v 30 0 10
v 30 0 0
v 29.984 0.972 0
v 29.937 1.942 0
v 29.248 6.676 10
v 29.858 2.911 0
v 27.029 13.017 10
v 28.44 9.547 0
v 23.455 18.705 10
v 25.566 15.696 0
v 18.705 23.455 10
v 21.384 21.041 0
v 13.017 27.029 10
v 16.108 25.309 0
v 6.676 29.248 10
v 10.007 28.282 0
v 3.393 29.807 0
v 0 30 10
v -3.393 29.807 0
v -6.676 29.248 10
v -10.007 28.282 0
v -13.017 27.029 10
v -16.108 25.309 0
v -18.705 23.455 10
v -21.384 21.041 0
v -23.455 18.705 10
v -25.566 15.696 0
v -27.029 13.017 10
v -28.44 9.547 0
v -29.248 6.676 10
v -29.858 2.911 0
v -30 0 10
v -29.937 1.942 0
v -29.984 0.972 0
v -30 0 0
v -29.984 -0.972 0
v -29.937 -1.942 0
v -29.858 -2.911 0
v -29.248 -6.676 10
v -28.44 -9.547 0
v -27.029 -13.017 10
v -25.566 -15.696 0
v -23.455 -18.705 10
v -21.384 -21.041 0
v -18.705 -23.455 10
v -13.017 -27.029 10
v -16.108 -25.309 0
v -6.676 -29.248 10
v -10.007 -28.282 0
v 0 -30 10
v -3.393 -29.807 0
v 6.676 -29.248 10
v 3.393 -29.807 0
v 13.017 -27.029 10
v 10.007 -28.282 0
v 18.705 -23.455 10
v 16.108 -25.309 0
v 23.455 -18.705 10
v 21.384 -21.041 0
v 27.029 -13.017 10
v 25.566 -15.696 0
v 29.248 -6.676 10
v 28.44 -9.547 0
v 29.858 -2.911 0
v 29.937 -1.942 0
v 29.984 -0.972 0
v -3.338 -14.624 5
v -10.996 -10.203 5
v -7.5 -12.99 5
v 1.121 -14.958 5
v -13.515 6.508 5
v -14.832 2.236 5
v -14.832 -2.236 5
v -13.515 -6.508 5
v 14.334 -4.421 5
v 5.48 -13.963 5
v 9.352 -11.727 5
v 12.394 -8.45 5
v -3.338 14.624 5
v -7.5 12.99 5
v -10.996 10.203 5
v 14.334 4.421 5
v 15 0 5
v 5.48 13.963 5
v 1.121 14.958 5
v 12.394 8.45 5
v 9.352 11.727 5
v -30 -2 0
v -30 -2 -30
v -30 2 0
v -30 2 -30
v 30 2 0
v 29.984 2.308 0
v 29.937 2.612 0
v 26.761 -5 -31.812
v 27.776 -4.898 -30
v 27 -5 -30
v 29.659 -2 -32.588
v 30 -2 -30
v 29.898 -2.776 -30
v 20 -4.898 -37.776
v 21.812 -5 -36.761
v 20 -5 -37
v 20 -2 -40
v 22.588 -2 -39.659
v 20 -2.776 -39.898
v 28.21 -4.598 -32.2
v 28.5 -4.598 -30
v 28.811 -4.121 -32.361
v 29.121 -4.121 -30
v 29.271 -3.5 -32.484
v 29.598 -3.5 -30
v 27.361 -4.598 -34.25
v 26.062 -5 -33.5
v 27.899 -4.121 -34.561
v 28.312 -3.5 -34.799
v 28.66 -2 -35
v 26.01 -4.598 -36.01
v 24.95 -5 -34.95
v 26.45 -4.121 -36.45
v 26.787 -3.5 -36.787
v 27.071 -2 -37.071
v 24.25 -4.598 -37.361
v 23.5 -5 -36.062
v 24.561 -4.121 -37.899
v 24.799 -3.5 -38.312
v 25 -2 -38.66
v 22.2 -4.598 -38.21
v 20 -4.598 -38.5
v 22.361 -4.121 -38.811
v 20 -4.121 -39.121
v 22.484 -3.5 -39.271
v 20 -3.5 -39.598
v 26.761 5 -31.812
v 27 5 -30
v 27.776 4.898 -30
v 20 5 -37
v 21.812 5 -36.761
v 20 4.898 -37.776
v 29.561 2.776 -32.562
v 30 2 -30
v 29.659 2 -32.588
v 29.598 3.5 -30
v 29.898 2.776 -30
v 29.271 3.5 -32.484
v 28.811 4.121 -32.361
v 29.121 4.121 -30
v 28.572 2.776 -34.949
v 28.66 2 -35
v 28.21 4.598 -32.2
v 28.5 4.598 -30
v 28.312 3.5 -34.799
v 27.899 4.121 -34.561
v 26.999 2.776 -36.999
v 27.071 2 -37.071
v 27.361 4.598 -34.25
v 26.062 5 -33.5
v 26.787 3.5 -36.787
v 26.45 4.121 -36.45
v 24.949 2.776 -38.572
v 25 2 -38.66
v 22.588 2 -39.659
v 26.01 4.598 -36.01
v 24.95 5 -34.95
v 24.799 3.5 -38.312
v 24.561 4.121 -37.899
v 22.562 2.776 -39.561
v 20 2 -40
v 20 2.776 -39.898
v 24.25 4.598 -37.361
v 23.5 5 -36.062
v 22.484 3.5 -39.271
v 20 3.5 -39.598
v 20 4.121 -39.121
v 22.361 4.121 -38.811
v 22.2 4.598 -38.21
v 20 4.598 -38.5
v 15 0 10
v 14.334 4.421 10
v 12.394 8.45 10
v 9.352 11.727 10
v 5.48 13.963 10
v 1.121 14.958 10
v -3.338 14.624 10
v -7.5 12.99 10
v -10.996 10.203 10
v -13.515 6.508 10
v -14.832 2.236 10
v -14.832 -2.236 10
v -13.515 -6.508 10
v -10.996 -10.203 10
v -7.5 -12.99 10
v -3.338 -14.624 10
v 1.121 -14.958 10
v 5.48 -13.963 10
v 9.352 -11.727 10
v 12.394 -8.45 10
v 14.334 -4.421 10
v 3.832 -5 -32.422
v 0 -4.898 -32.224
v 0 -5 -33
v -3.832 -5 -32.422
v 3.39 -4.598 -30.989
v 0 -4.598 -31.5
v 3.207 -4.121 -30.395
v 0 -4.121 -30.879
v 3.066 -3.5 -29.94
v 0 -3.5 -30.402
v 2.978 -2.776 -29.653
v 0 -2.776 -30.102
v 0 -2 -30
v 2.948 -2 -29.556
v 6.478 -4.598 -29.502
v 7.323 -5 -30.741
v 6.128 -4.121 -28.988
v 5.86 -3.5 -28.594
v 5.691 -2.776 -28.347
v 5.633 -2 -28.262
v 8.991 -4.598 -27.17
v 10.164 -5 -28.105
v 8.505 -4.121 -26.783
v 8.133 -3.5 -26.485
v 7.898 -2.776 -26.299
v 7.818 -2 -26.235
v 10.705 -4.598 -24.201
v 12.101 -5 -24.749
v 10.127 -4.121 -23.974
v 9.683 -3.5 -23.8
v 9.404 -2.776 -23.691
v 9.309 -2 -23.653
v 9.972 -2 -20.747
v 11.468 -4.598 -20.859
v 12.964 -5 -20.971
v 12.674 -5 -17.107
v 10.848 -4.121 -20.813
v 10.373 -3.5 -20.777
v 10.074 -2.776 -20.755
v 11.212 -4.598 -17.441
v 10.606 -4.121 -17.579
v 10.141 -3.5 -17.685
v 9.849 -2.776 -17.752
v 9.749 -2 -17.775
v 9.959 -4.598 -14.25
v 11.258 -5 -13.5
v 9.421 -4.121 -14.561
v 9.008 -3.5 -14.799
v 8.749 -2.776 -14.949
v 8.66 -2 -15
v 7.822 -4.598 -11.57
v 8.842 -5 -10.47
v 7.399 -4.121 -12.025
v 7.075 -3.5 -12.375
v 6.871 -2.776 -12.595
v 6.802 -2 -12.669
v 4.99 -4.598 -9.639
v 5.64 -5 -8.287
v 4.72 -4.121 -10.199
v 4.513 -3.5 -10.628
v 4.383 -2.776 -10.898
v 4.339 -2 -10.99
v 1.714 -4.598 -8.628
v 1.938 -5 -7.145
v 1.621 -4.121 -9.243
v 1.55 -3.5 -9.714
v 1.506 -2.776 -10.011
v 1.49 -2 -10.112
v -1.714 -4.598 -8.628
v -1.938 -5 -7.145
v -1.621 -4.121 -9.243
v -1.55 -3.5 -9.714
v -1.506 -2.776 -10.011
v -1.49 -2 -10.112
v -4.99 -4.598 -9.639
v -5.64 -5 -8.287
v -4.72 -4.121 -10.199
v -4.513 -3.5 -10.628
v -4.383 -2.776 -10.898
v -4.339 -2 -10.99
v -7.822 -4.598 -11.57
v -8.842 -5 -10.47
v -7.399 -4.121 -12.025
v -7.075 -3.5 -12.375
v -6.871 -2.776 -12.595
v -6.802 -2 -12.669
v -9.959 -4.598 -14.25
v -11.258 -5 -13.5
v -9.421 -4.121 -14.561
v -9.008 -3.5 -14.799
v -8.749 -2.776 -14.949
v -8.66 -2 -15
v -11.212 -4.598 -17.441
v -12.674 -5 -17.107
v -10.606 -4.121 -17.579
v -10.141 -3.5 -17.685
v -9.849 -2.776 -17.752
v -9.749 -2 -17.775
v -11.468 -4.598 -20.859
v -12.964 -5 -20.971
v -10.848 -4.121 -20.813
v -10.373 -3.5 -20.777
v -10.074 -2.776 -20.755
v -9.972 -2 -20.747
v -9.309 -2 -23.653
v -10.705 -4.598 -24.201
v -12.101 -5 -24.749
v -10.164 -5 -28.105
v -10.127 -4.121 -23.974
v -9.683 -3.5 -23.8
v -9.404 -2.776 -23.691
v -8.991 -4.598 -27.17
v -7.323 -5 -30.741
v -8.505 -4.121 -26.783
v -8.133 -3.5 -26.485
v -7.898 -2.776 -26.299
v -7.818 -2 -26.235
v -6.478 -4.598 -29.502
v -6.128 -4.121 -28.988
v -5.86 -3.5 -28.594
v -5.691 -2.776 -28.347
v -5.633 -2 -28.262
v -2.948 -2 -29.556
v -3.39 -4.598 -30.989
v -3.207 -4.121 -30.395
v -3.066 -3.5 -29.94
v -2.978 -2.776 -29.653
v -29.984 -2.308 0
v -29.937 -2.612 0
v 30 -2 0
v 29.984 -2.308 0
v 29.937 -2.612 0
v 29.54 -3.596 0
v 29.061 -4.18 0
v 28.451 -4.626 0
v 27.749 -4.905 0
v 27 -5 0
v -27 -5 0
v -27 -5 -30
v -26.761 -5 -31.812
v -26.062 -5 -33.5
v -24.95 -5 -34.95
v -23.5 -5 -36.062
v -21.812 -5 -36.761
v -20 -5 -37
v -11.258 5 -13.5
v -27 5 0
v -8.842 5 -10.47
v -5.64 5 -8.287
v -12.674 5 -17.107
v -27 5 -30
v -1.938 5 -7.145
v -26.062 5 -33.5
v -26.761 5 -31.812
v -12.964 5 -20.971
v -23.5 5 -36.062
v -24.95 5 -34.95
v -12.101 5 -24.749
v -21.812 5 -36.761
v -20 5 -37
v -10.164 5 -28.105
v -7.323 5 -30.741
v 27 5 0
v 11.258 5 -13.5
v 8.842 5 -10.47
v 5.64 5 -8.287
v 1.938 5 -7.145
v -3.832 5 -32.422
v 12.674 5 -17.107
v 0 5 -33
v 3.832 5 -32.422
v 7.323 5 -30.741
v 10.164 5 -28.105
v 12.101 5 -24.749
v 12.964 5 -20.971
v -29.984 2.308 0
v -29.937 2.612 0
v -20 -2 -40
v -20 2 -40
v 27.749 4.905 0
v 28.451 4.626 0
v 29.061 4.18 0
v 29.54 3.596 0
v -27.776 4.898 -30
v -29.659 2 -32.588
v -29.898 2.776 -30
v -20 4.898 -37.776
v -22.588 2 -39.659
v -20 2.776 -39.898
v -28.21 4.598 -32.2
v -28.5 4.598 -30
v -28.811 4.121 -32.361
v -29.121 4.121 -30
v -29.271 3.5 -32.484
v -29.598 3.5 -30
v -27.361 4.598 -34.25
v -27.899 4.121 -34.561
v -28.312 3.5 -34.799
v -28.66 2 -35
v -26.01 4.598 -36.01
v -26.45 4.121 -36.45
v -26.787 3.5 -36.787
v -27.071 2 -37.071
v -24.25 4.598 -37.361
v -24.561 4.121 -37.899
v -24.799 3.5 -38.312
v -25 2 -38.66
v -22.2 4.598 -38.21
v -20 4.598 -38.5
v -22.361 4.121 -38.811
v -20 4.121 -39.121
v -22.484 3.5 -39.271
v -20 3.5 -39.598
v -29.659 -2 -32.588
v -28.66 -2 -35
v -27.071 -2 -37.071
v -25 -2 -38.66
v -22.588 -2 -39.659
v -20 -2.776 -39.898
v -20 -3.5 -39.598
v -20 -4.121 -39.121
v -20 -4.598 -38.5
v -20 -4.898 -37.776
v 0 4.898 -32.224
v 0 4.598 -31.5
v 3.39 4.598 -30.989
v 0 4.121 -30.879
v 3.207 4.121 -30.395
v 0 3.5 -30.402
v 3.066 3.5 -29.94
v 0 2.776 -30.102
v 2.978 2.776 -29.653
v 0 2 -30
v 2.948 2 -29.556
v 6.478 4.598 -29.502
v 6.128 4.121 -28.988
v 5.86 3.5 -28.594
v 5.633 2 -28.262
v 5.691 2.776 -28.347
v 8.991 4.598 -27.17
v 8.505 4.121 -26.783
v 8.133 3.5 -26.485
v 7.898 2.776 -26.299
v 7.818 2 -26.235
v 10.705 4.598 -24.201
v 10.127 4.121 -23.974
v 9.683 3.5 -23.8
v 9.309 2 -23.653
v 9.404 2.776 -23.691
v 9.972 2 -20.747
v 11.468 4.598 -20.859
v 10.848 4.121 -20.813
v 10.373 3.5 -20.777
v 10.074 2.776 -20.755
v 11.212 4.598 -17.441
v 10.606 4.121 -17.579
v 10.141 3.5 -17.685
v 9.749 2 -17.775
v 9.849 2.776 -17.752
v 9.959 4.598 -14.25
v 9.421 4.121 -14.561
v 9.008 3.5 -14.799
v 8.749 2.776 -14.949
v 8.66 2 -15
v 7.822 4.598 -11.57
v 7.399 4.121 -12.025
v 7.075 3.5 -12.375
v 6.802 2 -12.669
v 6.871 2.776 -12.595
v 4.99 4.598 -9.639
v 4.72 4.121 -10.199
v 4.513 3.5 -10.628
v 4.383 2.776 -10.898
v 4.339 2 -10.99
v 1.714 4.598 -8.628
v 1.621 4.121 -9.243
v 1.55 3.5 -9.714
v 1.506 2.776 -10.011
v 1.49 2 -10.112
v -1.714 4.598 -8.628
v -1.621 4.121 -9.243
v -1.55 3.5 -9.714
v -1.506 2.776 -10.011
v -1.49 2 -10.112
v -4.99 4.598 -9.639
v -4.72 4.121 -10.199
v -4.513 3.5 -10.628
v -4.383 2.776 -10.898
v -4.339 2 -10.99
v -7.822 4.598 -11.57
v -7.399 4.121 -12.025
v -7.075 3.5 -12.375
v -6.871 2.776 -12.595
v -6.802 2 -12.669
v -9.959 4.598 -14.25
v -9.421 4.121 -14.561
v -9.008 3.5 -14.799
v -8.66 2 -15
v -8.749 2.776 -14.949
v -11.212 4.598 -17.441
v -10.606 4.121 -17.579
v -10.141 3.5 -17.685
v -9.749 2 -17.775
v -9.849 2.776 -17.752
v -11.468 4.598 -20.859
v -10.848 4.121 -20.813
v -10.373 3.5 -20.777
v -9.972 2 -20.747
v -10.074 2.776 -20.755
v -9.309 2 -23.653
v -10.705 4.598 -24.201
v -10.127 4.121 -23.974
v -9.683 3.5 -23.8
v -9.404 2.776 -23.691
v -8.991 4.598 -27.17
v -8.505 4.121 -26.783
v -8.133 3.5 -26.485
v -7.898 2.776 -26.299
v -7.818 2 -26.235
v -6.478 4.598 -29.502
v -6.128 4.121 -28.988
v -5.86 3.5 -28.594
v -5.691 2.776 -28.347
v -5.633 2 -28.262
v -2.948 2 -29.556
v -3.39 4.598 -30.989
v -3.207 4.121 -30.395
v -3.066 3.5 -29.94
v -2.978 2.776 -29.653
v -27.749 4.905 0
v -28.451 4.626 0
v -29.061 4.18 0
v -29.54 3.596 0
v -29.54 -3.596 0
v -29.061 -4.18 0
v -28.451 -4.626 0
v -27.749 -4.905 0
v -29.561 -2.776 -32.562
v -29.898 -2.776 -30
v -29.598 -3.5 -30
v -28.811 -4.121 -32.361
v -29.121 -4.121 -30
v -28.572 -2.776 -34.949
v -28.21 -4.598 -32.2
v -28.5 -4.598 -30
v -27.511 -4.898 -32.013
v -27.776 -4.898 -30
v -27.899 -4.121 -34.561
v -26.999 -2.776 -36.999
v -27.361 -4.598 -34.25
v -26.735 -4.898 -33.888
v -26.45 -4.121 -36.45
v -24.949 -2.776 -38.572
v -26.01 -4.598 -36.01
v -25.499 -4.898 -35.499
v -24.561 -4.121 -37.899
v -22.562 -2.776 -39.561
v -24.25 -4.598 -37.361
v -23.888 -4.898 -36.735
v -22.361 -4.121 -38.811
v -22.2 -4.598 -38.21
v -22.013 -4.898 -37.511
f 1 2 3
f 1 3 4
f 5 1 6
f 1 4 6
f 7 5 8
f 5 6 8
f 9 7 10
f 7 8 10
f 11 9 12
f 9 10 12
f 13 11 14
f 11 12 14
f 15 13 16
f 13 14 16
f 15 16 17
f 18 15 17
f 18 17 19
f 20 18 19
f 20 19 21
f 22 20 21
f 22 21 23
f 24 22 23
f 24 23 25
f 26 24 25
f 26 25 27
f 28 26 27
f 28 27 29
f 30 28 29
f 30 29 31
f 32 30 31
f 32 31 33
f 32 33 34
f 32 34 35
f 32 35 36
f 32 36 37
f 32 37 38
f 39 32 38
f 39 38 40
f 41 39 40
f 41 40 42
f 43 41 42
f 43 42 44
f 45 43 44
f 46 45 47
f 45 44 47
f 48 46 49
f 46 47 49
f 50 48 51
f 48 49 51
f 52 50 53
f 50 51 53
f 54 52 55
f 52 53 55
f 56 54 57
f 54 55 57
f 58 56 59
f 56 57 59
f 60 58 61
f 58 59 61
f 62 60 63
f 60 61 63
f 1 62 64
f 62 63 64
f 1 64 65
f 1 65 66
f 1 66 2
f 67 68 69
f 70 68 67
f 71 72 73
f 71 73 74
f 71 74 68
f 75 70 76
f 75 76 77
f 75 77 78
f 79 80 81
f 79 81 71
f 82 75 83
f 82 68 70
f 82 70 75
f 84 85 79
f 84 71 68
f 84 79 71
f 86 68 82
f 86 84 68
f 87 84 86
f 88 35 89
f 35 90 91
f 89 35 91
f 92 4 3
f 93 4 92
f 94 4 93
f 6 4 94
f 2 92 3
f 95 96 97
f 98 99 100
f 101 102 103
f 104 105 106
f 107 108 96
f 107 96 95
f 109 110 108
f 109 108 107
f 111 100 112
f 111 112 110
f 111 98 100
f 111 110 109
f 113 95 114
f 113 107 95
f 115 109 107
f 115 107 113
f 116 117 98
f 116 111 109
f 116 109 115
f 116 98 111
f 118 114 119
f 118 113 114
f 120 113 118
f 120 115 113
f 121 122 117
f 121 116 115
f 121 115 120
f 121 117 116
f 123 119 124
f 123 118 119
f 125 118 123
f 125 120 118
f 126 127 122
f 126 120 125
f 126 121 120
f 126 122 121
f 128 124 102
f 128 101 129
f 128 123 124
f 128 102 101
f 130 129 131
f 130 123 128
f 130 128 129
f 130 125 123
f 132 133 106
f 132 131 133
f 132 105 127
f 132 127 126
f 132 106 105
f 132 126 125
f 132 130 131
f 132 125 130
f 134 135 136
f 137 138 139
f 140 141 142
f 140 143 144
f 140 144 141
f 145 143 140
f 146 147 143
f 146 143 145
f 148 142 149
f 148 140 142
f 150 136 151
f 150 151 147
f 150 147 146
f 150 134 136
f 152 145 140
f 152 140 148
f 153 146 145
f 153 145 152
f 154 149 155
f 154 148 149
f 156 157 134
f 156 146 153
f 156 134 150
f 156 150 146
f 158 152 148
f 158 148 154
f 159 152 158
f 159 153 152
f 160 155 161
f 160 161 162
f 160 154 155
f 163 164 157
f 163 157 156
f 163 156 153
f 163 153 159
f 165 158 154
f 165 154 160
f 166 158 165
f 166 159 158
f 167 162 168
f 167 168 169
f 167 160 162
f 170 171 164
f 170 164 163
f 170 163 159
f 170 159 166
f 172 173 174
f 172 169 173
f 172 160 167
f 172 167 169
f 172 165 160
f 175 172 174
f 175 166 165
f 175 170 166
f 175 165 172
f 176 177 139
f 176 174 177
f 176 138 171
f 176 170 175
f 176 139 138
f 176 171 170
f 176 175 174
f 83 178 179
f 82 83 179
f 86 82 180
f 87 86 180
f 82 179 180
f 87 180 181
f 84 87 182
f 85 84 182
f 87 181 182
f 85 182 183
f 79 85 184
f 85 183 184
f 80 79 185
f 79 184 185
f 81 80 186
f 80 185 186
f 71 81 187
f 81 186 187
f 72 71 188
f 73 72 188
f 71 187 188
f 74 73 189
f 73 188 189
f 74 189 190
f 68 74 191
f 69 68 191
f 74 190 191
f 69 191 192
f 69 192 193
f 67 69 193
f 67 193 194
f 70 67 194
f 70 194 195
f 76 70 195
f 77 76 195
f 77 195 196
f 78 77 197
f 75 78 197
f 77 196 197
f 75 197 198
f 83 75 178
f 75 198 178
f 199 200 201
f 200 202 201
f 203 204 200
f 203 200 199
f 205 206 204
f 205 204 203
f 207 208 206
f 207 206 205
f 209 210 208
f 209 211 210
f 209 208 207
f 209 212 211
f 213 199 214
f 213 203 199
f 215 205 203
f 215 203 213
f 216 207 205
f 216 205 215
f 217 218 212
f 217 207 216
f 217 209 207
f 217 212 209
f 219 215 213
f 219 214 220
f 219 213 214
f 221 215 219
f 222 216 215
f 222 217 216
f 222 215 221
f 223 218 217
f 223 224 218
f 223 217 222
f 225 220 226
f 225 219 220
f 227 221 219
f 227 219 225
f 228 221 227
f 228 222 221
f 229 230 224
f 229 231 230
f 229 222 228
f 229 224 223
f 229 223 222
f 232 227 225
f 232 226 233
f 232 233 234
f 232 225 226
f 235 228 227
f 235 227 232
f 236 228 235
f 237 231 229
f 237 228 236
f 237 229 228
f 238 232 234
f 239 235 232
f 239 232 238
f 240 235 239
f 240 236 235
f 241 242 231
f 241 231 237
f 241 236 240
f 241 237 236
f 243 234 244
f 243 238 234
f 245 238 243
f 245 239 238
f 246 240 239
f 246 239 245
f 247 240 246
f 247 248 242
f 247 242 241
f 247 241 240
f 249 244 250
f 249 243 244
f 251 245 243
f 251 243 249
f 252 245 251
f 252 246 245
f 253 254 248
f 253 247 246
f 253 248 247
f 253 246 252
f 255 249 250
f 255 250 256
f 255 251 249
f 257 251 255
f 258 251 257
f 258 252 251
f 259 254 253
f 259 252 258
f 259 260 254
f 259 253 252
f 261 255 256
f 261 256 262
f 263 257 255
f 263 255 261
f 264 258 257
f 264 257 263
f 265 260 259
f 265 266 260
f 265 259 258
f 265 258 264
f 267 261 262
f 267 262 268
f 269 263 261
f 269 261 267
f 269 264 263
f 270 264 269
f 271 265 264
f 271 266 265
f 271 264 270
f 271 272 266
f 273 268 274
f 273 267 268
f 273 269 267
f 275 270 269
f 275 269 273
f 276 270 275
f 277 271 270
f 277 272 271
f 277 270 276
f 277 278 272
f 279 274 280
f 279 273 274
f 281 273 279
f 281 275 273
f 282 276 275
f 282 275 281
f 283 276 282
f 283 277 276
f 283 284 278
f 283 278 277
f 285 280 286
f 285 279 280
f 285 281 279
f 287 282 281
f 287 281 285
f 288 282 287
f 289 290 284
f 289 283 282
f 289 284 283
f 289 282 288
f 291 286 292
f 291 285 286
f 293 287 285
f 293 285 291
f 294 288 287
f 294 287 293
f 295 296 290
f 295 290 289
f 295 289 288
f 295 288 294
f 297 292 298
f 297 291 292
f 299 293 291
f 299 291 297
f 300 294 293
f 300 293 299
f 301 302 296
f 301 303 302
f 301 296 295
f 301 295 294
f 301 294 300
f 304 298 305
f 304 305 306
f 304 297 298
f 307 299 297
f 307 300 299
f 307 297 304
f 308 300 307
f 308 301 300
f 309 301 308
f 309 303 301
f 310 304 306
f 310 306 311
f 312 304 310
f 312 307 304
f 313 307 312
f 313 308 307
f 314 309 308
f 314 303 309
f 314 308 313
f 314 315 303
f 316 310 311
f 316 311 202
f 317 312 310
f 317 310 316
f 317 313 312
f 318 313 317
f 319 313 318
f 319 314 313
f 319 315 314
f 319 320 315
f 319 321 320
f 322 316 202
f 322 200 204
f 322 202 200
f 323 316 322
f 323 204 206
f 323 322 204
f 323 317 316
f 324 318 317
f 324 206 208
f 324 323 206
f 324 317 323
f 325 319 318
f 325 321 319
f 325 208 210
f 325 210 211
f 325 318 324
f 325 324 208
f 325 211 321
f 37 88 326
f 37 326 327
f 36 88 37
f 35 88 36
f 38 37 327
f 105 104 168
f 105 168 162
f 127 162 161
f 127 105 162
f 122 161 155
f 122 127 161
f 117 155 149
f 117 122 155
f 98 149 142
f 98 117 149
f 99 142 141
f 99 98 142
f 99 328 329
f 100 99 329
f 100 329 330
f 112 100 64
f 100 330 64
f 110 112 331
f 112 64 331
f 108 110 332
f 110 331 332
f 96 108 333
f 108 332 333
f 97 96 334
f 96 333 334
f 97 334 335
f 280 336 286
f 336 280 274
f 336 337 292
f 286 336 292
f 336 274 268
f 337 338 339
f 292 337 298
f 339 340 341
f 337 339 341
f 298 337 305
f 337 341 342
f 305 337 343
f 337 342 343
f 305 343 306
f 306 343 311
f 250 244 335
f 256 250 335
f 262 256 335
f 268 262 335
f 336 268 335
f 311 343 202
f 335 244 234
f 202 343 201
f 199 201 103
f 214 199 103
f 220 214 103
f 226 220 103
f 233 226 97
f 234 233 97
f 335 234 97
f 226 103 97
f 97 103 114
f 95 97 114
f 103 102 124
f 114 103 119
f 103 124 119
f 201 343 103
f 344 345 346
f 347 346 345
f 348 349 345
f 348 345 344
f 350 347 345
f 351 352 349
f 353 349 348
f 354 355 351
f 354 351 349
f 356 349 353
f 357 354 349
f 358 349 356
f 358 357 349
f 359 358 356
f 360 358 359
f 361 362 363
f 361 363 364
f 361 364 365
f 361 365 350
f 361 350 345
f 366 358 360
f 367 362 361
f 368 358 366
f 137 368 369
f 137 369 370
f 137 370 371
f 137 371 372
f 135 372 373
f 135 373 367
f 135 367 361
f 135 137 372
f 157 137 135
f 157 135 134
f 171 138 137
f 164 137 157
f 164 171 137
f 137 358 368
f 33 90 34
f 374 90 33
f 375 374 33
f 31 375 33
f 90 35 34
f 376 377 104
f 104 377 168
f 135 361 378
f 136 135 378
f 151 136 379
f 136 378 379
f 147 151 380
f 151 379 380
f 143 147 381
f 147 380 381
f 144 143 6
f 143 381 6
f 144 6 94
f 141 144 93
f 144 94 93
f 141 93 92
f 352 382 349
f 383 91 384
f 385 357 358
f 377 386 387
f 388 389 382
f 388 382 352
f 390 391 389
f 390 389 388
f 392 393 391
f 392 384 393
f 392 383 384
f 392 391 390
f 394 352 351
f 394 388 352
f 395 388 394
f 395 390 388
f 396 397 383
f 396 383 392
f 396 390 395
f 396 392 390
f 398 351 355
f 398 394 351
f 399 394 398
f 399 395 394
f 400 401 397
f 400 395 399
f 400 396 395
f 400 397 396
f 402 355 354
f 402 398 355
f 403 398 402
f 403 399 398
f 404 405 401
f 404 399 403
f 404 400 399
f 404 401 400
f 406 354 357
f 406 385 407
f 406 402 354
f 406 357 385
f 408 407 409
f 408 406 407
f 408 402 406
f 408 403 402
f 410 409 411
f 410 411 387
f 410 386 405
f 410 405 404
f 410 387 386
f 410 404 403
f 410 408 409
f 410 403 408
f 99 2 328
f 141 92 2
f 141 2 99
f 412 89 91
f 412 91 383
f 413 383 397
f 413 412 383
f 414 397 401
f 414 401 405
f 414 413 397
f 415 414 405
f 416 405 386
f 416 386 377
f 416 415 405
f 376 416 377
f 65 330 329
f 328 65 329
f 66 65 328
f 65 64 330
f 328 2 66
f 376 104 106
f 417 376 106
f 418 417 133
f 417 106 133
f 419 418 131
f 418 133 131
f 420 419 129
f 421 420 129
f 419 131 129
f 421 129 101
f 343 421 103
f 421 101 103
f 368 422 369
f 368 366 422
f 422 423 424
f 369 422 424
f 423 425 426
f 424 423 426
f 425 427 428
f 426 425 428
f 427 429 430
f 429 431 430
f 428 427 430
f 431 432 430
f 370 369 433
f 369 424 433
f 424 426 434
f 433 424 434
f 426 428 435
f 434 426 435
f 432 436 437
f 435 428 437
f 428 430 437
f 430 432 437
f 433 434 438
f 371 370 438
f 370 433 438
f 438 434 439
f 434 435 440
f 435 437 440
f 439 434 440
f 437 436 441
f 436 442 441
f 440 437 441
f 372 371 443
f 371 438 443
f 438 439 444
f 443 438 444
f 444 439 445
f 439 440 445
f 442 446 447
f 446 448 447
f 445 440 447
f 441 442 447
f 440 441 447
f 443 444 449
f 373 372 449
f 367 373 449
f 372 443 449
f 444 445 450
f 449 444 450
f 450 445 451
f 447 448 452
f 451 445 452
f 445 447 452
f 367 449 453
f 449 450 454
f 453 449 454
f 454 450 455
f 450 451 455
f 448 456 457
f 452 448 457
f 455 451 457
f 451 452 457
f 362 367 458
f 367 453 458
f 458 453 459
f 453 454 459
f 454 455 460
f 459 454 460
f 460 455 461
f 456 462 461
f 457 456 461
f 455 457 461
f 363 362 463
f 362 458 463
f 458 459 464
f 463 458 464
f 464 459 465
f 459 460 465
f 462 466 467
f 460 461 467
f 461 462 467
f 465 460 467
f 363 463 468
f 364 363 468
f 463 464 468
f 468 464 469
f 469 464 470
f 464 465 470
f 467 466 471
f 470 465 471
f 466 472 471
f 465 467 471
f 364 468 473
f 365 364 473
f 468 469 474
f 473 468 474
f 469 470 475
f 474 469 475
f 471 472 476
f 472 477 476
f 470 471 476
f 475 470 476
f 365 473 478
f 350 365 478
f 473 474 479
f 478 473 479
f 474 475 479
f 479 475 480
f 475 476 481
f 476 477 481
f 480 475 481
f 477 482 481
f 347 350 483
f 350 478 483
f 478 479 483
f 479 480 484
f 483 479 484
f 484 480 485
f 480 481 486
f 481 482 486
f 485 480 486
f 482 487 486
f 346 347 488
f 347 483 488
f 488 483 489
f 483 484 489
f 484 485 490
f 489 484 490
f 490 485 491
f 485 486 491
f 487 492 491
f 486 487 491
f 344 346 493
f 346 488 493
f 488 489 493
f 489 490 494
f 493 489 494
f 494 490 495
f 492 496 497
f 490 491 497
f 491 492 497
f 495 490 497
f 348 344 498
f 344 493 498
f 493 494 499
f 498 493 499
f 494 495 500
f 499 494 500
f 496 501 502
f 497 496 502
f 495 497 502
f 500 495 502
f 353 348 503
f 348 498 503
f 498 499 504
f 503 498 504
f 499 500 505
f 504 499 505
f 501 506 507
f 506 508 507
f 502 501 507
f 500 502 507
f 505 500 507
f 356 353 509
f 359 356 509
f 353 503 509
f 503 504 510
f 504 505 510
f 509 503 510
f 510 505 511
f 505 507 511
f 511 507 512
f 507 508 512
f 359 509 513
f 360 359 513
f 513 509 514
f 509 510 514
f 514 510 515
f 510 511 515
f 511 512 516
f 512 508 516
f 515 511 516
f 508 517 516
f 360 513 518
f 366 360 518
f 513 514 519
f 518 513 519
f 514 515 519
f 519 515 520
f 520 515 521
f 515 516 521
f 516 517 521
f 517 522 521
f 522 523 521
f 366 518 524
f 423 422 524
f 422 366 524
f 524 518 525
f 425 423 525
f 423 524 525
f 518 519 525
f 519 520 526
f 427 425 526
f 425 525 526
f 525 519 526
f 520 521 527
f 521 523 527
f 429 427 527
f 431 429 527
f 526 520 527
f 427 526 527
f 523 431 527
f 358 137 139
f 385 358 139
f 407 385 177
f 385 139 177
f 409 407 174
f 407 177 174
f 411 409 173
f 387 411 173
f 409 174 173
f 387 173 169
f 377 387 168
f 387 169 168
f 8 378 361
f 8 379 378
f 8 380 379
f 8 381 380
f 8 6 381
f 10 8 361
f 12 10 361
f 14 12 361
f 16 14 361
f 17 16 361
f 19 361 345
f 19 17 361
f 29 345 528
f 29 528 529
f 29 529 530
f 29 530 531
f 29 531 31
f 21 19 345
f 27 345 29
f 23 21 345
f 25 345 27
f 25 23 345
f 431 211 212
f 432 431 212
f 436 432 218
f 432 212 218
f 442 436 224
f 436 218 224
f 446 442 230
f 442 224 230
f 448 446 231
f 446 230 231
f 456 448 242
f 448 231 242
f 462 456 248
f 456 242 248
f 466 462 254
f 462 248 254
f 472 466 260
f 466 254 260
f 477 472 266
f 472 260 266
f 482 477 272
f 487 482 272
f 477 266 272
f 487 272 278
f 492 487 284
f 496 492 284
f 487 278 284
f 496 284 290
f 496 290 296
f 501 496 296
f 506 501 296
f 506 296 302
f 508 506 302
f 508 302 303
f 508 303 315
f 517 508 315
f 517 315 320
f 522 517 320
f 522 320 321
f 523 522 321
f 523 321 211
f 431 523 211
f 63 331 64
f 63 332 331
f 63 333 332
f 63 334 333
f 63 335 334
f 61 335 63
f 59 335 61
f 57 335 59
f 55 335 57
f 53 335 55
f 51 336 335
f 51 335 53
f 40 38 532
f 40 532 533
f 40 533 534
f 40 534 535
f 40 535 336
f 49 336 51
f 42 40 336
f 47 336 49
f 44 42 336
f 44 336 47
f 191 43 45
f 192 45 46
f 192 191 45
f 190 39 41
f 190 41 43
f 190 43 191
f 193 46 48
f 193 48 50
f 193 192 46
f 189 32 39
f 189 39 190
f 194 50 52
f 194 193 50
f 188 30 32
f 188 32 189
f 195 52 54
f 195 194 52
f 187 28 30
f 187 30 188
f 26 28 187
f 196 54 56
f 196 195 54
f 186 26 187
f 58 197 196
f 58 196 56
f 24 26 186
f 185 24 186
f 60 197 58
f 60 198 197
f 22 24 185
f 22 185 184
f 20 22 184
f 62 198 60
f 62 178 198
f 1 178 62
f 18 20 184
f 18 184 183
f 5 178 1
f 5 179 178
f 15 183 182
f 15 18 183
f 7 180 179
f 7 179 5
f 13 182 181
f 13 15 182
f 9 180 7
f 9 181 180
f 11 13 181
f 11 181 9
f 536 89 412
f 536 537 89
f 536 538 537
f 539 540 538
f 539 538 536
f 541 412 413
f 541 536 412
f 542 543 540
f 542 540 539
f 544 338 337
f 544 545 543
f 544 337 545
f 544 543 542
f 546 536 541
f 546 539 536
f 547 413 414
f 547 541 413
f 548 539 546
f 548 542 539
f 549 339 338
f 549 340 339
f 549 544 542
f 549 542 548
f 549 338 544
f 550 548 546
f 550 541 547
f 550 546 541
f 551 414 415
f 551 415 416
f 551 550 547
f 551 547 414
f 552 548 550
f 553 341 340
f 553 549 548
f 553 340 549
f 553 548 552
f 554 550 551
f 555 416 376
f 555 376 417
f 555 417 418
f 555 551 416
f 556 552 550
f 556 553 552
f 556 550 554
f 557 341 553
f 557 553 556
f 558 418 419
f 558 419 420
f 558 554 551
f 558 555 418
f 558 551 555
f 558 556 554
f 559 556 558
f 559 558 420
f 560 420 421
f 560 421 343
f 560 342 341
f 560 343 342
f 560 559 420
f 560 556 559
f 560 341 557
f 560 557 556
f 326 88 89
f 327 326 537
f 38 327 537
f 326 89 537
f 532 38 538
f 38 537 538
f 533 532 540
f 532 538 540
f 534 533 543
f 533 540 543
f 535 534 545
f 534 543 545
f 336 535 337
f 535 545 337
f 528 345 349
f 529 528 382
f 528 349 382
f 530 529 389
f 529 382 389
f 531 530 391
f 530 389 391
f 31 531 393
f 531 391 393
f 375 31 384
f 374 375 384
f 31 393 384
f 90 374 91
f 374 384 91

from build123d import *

# Parameters (mm, degrees)
CROQUIS1_R              = 30
SALIENTE_EXTRUIR1_DEPTH = 10
CROQUIS2_W              = 60
CROQUIS2_H              = 40
SALIENTE_EXTRUIR2_DEPTH = 5
REDONDEO1_R             = 10
REDONDEO2_R             = 3
CROQUIS3_R              = 15
CORTAR_EXTRUIR1_DEPTH   = 5
CROQUIS4_R              = 10
CORTAR_EXTRUIR2_DEPTH   = 62.032778128
REDONDEO3_R             = 3


with BuildPart() as part:
    # Croquis1 → Saliente-Extruir1 (new body)
    with BuildSketch(Plane.XY):
        Circle(CROQUIS1_R)
    extrude(amount=SALIENTE_EXTRUIR1_DEPTH)

    # Croquis2 → Saliente-Extruir2 (add, symmetric)
    with BuildSketch(Plane(origin=(0, 0, 0), x_dir=(1, 0, 0), z_dir=(0, 1, 0))):
        with Locations((0, 20)):
            Rectangle(CROQUIS2_W, CROQUIS2_H)
    extrude(amount=SALIENTE_EXTRUIR2_DEPTH, both=True)

    # Redondeo1
    redondeo1_edges = [part.edges().sort_by_distance(p)[0] for p in [
        (-30, 0, -40),
        (30, 0, -40),
    ]]
    fillet(redondeo1_edges, radius=REDONDEO1_R)

    # Redondeo2
    # the kernel refuses this fillet: 3 mm, written as the material it takes off along each edge
    with BuildSketch(Plane(origin=(30, -5, 0), x_dir=(0, 1, 0), z_dir=(0, 0, -1)), Plane(origin=(30, 5, 0), x_dir=(-1, 0, 0), z_dir=(0, 0, -1)), Plane(origin=(-30, -5, -30), x_dir=(0, 1, 0), z_dir=(0, 0, 1)), Plane(origin=(-30, 5, -30), x_dir=(1, 0, 0), z_dir=(0, 0, 1))) as redondeo2_piece_1:
        with BuildLine():
            CenterArc((REDONDEO2_R, -REDONDEO2_R), REDONDEO2_R, 90, 90)
            Line((0, -REDONDEO2_R), (0, 0))
            Line((0, 0), (REDONDEO2_R, 0))
        make_face()
    extrude(amount=30, mode=Mode.SUBTRACT)
    with BuildSketch(Plane(origin=(20, -5, -40), x_dir=(0, 1, 0), z_dir=(-1, 0, 0)), Plane(origin=(20, 5, -40), x_dir=(0, 0, 1), z_dir=(-1, 0, 0))) as redondeo2_piece_2:
        with BuildLine():
            CenterArc((REDONDEO2_R, -REDONDEO2_R), REDONDEO2_R, 90, 90)
            Line((0, -REDONDEO2_R), (0, 0))
            Line((0, 0), (REDONDEO2_R, 0))
        make_face()
    extrude(amount=40, mode=Mode.SUBTRACT)
    with BuildSketch(Plane(origin=(-20, -5, -30), x_dir=(-1, 0, 0), z_dir=(0, 0, 1))) as redondeo2_piece_3:
        with BuildLine():
            CenterArc((10 - REDONDEO2_R, -REDONDEO2_R), REDONDEO2_R, 0, 90)
            Line((10 - REDONDEO2_R, 0), (10, 0))
            Line((10, 0), (10, -REDONDEO2_R))
        make_face()
    revolve(axis=Axis((-20, -5, -30), (0, -1, 0)), revolution_arc=90, mode=Mode.SUBTRACT)
    with BuildSketch(Plane(origin=(20, -5, -30), x_dir=(1, 0, 0), z_dir=(0, 0, 1))) as redondeo2_piece_4:
        with BuildLine():
            CenterArc((10 - REDONDEO2_R, REDONDEO2_R), REDONDEO2_R, 270, 90)
            Line((10 - REDONDEO2_R, 0), (10, 0))
            Line((10, 0), (10, REDONDEO2_R))
        make_face()
    revolve(axis=Axis((20, -5, -30), (0, 1, 0)), revolution_arc=90, mode=Mode.SUBTRACT)
    with BuildSketch(Plane(origin=(-20, 5, -30), x_dir=(-1, 0, 0), z_dir=(0, 0, 1))) as redondeo2_piece_5:
        with BuildLine():
            CenterArc((10 - REDONDEO2_R, REDONDEO2_R), REDONDEO2_R, 270, 90)
            Line((10, REDONDEO2_R), (10, 0))
            Line((10, 0), (10 - REDONDEO2_R, 0))
        make_face()
    revolve(axis=Axis((-20, 5, -30), (0, -1, 0)), revolution_arc=90, mode=Mode.SUBTRACT)
    with BuildSketch(Plane(origin=(20, 5, -30), x_dir=(1, 0, 0), z_dir=(0, 0, 1))) as redondeo2_piece_6:
        with BuildLine():
            CenterArc((10 - REDONDEO2_R, -REDONDEO2_R), REDONDEO2_R, 0, 90)
            Line((10, -REDONDEO2_R), (10, 0))
            Line((10, 0), (10 - REDONDEO2_R, 0))
        make_face()
    revolve(axis=Axis((20, 5, -30), (0, 1, 0)), revolution_arc=90, mode=Mode.SUBTRACT)

    # Croquis3 → Cortar-Extruir1 (cut)
    with BuildSketch(Plane.XY.offset(10)):
        Circle(CROQUIS3_R)
    extrude(amount=-CORTAR_EXTRUIR1_DEPTH, mode=Mode.SUBTRACT)

    # Croquis4 → Cortar-Extruir2 (cut, through all)
    with BuildSketch(Plane.XZ.offset(5)):
        with Locations(Location((0, -20, 0), (0, 0, 270))):
            Circle(CROQUIS4_R)
    extrude(amount=-CORTAR_EXTRUIR2_DEPTH, mode=Mode.SUBTRACT)

    # Redondeo3
    redondeo3_edges = [part.edges().sort_by_distance(p)[0] for p in [
        (0, 5, -10),
        (0, -5, -10),
    ]]
    fillet(redondeo3_edges, radius=REDONDEO3_R)


solid = part.part
